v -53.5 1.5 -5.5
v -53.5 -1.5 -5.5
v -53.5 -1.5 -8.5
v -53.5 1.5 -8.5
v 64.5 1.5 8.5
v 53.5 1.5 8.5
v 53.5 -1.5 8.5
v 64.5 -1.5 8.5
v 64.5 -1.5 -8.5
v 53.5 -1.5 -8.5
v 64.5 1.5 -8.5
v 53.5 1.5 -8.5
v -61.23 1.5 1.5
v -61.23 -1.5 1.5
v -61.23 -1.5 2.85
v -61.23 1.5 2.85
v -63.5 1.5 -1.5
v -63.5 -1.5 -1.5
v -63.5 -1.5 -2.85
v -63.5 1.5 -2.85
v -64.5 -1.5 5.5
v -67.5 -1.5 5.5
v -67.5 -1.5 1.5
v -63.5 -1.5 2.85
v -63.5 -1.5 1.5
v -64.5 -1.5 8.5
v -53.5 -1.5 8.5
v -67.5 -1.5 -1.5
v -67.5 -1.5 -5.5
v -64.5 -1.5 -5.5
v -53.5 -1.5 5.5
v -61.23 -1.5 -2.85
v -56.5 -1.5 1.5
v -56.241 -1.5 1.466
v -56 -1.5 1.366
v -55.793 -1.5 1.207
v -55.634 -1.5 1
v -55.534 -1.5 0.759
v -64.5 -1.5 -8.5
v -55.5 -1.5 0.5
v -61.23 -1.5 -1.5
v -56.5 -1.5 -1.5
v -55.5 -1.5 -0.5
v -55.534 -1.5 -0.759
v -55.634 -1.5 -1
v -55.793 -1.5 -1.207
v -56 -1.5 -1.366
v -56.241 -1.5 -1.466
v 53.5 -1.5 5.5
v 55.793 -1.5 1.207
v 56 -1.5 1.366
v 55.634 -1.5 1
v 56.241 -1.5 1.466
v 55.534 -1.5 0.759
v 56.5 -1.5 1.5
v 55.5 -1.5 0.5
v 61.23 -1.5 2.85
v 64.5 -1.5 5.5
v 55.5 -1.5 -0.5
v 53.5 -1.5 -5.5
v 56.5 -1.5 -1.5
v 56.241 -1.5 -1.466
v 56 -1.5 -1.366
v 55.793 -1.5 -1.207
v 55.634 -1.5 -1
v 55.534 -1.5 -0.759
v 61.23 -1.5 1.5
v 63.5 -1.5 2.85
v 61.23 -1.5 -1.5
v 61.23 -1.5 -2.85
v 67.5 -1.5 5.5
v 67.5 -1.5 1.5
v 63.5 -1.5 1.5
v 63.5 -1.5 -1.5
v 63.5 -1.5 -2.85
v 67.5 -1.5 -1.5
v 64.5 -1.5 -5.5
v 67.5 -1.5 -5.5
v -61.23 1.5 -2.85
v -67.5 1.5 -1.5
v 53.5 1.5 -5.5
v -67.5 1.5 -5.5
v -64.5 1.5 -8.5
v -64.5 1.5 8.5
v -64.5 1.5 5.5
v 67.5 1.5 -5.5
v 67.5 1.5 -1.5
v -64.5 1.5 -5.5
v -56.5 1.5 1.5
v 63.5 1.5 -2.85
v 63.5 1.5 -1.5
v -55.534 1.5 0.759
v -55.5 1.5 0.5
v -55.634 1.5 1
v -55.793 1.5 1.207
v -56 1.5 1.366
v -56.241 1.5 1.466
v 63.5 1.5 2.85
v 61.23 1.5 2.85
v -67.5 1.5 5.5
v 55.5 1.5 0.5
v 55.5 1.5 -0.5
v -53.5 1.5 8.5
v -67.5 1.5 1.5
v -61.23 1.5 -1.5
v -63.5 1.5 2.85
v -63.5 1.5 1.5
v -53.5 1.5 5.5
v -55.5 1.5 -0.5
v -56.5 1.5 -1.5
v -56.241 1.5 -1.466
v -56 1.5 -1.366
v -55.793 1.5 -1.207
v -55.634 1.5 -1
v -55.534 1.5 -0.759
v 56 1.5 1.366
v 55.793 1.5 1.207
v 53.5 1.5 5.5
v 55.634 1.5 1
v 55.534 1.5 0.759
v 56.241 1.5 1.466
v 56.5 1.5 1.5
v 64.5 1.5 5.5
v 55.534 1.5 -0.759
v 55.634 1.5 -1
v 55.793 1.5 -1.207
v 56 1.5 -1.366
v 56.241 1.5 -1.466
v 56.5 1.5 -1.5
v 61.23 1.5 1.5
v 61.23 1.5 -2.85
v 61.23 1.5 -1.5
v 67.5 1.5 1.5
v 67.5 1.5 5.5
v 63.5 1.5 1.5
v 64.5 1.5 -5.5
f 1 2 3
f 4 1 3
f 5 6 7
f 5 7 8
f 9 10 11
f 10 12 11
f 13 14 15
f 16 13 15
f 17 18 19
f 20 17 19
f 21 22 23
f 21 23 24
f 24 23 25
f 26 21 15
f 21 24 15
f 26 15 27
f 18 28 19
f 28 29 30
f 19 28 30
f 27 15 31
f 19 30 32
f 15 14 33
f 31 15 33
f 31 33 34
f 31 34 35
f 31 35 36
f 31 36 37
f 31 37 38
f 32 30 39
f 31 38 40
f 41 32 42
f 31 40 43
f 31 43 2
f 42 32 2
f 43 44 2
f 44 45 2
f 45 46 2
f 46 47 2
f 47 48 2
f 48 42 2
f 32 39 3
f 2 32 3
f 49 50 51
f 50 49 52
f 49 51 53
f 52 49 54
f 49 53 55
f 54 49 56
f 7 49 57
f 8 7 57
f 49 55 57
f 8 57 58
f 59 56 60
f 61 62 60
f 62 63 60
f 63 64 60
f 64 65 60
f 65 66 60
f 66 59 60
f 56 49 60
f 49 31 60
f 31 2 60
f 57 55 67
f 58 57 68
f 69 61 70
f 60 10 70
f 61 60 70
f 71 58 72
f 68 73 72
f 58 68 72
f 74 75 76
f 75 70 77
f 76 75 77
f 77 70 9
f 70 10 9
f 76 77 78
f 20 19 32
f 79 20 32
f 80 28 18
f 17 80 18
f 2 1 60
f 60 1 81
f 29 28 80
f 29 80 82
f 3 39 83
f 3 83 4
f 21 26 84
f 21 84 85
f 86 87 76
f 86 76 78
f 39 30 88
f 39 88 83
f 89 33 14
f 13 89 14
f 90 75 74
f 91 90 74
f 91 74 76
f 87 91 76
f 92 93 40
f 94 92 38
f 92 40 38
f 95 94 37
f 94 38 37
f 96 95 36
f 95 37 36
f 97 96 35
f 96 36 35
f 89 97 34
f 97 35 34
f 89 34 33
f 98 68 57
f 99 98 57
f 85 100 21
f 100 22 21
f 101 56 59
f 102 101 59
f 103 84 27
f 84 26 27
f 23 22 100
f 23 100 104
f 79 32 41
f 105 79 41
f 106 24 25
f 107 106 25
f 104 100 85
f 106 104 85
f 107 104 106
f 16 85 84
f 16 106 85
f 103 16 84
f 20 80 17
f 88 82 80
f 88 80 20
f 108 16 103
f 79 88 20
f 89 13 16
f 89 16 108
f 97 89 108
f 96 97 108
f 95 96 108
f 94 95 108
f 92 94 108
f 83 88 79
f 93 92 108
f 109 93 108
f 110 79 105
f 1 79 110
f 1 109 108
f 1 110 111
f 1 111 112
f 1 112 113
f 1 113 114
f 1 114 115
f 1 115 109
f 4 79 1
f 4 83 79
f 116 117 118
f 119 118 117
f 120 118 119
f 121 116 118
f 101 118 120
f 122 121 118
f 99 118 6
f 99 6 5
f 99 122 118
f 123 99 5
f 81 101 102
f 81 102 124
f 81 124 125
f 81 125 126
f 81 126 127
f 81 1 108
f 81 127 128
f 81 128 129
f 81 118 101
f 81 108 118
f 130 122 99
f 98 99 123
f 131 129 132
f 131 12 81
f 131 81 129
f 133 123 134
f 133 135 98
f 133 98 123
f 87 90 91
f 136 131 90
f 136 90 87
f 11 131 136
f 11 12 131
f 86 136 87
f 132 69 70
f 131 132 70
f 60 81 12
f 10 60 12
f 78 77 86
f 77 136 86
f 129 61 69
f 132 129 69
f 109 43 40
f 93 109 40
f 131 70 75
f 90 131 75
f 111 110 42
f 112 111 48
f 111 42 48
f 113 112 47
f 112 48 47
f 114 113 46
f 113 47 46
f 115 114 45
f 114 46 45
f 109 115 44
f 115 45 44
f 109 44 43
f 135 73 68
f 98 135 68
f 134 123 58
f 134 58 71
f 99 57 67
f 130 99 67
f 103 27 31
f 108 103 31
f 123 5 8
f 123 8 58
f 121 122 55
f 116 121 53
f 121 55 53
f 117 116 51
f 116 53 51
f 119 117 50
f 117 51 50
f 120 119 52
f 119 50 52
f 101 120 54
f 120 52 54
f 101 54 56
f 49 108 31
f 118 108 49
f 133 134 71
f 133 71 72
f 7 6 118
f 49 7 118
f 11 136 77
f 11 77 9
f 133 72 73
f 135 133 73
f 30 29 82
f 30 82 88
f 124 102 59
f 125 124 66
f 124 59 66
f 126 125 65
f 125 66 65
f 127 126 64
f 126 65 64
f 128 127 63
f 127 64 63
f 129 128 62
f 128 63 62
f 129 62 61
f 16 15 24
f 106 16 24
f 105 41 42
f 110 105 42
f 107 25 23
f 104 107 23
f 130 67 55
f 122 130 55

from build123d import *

# Parameters (mm, degrees)
SKETCH1_W               = 107
SKETCH1_H               = 11
BOSS_EXTRUDE1_DEPTH     = 1.5
SKETCH3_W               = 11
SKETCH3_H               = 17
BOSS_EXTRUDE2_DEPTH     = 1.5
SKETCH4_W               = 3
SKETCH4_H               = 11
BOSS_EXTRUDE3_DEPTH     = 1.5
CUT_EXTRUDE1_DEPTH      = 69.049614253
CUT_EXTRUDE1_DEPTH_BACK = 69.049614253


with BuildPart() as part:
    # Sketch1 → Boss-Extrude1 (new, symmetric)
    with BuildSketch(Plane(origin=(0, 0, 0), x_dir=(1, 0, 0), z_dir=(0, 1, 0))):
        Rectangle(SKETCH1_W, SKETCH1_H)
    extrude(amount=BOSS_EXTRUDE1_DEPTH, both=True)

    # Sketch3 → Boss-Extrude2 (add, symmetric)
    with BuildSketch(Plane(origin=(0, 0, 0), x_dir=(1, 0, 0), z_dir=(0, 1, 0))):
        with Locations((-59, 0)):
            Rectangle(SKETCH3_W, SKETCH3_H)
        with Locations((59, 0)):
            Rectangle(SKETCH3_W, SKETCH3_H)
    extrude(amount=BOSS_EXTRUDE2_DEPTH, both=True)

    # Sketch4 → Boss-Extrude3 (add, symmetric)
    with BuildSketch(Plane(origin=(0, 0, 0), x_dir=(1, 0, 0), z_dir=(0, 1, 0))):
        with Locations((-66, 0)):
            Rectangle(SKETCH4_W, SKETCH4_H)
        with Locations((66, 0)):
            Rectangle(SKETCH4_W, SKETCH4_H)
    extrude(amount=BOSS_EXTRUDE3_DEPTH, both=True)

    # Sketch2 → Cut-Extrude1 (cut, two sides)
    with BuildSketch(Plane(origin=(0, 0, 0), x_dir=(1, 0, 0), z_dir=(0, 1, 0))) as cut_extrude1_sk:
        with BuildLine():
            Line((-67.5, 1.5), (-63.5, 1.5))
            Line((-63.5, 1.5), (-63.5, 2.85))
            Line((-63.5, 2.85), (-61.23, 2.85))
            Line((-61.23, 2.85), (-61.23, 1.5))
            Line((-61.23, 1.5), (-56.5, 1.5))
            ThreePointArc((-56.5, 1.5), (-55.792893219, 1.207106781), (-55.5, 0.5))
            Line((-55.5, 0.5), (-55.5, -0.5))
            ThreePointArc((-55.5, -0.5), (-55.792893219, -1.207106781), (-56.5, -1.5))
            Line((-56.5, -1.5), (-61.23, -1.5))
            Line((-61.23, -1.5), (-61.23, -2.85))
            Line((-61.23, -2.85), (-63.5, -2.85))
            Line((-63.5, -2.85), (-63.5, -1.5))
            Line((-63.5, -1.5), (-67.5, -1.5))
            Line((-67.5, -1.5), (-67.5, 1.5))
        make_face()
        with BuildLine():
            Line((61.23, -1.5), (56.5, -1.5))
            ThreePointArc((56.5, -1.5), (55.792893219, -1.207106781), (55.5, -0.5))
            Line((55.5, -0.5), (55.5, 0.5))
            ThreePointArc((55.5, 0.5), (55.792893219, 1.207106781), (56.5, 1.5))
            Line((56.5, 1.5), (61.23, 1.5))
            Line((61.23, 1.5), (61.23, 2.85))
            Line((61.23, 2.85), (63.5, 2.85))
            Line((63.5, 2.85), (63.5, 1.5))
            Line((63.5, 1.5), (67.5, 1.5))
            Line((67.5, 1.5), (67.5, -1.5))
            Line((67.5, -1.5), (63.5, -1.5))
            Line((63.5, -1.5), (63.5, -2.85))
            Line((63.5, -2.85), (61.23, -2.85))
            Line((61.23, -2.85), (61.23, -1.5))
        make_face()
    extrude(amount=CUT_EXTRUDE1_DEPTH, mode=Mode.SUBTRACT)
    extrude(cut_extrude1_sk.sketch, amount=-CUT_EXTRUDE1_DEPTH_BACK, mode=Mode.SUBTRACT)


solid = part.part
